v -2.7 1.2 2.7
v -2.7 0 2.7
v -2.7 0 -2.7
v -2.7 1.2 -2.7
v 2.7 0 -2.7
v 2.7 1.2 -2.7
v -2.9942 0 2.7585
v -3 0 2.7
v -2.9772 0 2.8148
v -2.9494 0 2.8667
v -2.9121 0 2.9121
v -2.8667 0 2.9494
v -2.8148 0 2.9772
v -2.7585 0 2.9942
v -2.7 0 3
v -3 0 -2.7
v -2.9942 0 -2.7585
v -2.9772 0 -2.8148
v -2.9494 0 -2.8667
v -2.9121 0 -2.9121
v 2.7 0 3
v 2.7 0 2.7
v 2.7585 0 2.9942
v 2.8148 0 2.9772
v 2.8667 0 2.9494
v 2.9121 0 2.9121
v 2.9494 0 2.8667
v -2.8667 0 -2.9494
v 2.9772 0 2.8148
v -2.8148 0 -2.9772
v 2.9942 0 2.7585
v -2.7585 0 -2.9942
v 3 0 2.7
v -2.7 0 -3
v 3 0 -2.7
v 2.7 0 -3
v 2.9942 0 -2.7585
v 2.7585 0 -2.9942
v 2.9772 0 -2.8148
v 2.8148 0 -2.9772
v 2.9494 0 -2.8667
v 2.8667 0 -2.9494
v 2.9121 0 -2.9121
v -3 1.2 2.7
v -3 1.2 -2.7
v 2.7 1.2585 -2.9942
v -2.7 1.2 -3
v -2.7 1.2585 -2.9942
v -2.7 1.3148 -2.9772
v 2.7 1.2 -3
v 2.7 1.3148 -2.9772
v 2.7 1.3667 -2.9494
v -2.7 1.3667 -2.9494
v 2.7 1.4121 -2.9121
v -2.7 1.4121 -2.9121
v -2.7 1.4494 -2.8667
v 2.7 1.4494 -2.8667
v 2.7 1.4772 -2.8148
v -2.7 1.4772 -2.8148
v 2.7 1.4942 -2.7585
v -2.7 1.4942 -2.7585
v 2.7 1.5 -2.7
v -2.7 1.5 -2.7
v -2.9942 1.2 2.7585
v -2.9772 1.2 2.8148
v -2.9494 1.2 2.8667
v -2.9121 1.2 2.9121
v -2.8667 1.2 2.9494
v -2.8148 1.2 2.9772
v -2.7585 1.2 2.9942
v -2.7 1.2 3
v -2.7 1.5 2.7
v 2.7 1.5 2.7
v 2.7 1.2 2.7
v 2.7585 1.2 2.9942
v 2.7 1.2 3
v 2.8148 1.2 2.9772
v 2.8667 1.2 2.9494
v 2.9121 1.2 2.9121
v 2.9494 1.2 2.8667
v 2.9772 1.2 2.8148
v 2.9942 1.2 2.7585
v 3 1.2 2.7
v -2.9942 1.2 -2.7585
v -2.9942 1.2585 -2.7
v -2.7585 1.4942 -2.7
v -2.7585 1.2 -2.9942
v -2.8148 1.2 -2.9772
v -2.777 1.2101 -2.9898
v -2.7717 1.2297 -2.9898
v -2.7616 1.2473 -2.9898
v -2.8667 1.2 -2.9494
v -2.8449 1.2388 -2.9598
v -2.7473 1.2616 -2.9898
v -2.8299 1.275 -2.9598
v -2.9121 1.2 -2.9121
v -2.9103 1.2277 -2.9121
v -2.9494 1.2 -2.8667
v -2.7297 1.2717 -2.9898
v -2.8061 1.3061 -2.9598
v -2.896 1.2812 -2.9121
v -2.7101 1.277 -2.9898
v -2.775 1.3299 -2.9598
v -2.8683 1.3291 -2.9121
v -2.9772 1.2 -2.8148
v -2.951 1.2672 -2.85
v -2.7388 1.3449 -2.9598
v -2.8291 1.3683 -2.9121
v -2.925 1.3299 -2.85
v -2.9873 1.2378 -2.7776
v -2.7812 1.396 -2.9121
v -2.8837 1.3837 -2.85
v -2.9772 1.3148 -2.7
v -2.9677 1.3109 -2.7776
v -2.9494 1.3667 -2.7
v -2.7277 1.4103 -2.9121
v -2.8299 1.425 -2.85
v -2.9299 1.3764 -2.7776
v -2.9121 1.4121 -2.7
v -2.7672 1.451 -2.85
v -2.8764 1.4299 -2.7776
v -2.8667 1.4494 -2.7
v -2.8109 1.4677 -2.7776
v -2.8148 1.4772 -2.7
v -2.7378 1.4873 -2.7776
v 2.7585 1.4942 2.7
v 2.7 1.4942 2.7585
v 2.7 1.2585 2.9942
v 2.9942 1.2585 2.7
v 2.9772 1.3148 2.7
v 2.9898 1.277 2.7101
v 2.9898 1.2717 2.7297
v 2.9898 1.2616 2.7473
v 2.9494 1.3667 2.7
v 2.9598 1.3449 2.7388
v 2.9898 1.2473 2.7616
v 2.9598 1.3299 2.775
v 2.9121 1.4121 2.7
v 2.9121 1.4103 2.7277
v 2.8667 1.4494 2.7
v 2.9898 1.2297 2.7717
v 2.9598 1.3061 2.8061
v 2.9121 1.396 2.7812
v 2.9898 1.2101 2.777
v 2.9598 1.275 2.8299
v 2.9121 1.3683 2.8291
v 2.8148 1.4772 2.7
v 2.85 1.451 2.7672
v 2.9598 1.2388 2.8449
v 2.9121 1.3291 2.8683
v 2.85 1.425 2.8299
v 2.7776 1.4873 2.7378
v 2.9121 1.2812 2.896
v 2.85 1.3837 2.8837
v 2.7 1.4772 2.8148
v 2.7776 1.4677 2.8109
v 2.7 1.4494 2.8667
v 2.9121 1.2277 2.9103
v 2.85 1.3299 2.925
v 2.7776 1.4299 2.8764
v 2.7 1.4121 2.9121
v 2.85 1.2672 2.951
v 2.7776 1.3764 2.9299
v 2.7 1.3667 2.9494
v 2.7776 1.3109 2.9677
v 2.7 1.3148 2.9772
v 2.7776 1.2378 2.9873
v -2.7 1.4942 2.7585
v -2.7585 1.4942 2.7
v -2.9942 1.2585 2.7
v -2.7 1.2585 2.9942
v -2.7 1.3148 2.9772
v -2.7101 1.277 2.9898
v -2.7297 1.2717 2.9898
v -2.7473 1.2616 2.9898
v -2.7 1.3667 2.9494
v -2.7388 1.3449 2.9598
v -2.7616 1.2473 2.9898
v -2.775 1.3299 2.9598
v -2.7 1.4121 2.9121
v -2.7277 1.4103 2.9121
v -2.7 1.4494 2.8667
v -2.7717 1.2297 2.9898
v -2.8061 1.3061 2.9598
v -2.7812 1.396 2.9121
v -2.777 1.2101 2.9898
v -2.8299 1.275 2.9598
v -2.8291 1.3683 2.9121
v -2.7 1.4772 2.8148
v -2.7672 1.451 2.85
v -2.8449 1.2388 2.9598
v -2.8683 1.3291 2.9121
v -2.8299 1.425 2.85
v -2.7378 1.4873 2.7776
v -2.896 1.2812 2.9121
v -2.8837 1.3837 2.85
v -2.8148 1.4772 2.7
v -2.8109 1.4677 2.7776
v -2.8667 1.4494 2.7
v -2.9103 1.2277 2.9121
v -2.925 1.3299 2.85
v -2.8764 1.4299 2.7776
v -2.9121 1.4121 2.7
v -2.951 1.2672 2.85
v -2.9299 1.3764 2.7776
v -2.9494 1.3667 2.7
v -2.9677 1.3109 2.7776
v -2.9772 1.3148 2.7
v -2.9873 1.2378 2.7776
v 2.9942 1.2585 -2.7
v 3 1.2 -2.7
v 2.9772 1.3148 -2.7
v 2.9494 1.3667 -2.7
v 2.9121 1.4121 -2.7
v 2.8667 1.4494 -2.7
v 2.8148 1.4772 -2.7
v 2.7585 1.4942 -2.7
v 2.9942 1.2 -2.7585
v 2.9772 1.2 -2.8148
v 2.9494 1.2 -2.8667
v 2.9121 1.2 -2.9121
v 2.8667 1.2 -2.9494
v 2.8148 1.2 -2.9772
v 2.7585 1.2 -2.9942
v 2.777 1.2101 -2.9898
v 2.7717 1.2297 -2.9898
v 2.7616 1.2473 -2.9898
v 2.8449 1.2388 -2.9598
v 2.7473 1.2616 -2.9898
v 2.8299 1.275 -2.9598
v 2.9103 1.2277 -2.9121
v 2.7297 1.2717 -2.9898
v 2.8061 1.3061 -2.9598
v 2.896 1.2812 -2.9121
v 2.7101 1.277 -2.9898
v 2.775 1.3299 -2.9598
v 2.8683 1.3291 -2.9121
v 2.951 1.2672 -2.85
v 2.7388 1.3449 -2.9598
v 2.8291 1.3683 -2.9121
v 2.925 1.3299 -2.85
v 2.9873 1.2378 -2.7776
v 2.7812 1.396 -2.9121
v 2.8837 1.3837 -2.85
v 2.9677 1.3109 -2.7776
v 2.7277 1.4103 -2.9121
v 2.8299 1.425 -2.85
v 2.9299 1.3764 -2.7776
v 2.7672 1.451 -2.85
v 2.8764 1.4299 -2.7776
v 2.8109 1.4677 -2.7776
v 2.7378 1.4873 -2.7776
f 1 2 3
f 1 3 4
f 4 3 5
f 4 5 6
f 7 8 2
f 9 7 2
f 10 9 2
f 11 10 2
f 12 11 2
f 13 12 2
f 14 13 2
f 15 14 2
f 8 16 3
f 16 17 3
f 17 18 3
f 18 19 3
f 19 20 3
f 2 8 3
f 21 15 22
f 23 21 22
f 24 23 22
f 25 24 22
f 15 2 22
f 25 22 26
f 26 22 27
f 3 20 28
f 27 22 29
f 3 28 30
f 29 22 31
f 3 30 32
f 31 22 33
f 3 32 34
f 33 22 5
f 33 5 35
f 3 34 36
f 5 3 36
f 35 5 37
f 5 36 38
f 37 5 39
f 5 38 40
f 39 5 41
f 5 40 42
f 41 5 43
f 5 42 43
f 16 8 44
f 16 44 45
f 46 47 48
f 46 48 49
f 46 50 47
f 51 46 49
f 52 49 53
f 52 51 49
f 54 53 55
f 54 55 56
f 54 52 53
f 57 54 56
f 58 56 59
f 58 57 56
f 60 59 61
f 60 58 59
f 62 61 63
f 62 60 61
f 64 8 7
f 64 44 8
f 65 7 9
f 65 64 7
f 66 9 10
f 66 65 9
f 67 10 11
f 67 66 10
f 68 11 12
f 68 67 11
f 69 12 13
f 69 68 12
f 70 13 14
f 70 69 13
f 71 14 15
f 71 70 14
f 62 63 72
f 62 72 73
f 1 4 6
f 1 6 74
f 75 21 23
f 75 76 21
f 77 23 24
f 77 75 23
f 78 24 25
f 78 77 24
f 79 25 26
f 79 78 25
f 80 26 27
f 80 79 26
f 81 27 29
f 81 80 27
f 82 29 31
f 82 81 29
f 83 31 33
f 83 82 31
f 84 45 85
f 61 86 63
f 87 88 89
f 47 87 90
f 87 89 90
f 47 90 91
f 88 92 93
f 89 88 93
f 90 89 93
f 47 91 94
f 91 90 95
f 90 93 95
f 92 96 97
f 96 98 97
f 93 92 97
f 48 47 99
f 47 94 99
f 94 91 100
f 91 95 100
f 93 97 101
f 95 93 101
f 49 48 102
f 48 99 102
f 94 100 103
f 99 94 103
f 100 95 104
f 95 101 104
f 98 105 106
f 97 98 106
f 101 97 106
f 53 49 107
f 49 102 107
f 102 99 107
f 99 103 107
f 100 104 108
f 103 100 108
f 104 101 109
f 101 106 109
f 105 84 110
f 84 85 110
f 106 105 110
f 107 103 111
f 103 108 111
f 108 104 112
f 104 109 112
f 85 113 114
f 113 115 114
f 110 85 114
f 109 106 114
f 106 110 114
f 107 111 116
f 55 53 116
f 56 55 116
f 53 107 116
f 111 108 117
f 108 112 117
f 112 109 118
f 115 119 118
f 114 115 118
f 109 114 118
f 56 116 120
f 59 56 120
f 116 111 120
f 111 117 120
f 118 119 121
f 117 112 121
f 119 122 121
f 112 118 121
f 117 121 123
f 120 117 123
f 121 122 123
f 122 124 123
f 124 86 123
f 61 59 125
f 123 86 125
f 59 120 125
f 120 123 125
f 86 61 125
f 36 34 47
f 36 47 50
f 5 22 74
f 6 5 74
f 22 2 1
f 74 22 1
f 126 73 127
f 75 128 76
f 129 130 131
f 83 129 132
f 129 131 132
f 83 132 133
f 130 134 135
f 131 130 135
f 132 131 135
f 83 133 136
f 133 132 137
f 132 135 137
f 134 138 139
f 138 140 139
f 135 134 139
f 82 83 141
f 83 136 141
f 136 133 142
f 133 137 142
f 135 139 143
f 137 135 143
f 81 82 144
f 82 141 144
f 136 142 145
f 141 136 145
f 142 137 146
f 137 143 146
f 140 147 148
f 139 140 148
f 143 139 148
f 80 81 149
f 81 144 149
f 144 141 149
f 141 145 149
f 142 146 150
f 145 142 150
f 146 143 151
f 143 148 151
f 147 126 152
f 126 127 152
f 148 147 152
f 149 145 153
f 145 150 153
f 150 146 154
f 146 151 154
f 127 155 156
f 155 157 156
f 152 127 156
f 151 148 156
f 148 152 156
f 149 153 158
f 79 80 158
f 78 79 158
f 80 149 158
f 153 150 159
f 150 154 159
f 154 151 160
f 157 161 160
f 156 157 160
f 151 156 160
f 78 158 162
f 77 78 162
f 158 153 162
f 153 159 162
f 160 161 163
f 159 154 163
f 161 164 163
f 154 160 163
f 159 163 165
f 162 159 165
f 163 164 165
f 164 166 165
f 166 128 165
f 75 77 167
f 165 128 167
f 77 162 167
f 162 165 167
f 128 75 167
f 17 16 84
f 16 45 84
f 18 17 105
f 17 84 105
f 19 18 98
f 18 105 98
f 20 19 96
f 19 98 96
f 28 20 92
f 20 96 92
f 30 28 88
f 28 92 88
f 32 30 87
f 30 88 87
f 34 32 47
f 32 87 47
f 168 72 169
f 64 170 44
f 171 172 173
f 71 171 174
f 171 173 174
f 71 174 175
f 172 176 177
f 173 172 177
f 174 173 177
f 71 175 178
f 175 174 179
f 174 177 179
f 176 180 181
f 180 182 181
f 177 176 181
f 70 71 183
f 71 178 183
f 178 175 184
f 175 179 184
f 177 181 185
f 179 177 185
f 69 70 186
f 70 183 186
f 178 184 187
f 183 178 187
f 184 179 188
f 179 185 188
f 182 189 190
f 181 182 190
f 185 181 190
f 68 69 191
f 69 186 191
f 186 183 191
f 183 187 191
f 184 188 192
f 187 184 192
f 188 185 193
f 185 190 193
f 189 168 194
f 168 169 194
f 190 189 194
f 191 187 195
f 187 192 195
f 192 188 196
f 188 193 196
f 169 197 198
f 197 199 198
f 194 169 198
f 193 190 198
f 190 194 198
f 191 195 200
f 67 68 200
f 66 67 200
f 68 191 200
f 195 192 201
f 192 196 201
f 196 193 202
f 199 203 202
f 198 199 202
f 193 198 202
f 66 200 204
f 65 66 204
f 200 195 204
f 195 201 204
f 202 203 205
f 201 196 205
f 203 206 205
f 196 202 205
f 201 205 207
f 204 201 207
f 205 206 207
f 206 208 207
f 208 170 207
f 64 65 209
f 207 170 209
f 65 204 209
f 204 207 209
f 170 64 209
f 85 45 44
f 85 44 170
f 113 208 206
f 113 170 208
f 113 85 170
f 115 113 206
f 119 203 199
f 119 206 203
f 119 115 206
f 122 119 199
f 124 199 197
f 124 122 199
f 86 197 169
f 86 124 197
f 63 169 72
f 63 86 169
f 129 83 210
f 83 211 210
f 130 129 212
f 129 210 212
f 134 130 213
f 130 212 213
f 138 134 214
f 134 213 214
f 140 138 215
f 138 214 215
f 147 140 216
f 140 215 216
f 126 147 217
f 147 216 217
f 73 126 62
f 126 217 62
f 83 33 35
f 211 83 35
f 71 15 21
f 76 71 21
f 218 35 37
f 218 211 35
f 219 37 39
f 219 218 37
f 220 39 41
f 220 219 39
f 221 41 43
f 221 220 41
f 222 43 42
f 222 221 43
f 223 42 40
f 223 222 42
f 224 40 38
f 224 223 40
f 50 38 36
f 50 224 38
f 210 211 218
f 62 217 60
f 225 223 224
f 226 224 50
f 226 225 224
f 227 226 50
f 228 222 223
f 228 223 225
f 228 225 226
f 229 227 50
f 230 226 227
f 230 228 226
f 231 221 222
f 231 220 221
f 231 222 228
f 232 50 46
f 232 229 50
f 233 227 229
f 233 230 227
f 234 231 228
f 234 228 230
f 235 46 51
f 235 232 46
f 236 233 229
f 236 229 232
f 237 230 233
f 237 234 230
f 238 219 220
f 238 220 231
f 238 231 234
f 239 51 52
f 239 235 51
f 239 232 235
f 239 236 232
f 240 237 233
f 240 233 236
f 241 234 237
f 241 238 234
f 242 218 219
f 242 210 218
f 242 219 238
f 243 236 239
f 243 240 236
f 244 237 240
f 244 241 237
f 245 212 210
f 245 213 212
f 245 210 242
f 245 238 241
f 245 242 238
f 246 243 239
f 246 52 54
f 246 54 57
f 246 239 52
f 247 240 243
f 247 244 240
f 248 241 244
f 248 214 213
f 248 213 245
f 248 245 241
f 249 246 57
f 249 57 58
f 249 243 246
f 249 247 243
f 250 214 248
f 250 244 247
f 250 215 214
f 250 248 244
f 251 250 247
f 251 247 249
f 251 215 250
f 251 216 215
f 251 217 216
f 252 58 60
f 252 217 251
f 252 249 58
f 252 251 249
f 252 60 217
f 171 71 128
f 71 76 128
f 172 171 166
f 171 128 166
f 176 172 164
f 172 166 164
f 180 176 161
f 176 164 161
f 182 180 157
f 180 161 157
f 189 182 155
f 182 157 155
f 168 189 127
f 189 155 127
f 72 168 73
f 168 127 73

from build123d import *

# Parameters (mm, degrees)
SKETCH1_W           = 6
SKETCH1_H           = 6
BOSS_EXTRUDE1_DEPTH = 1.5
FILLET1_R           = 0.3
SHELL1_START        = -2.7
SHELL1_OUTLINE_W    = 1.2
SHELL1_OUTLINE_H    = 5.4
SHELL1_DEPTH        = 5.4


# Read off the part's stored shape, not the designer's step: Shell1
with BuildPart() as part:
    # Sketch1 → Boss-Extrude1 (new body)
    with BuildSketch(Plane(origin=(0, 0, 0), x_dir=(1, 0, 0), z_dir=(0, 1, 0))):
        Rectangle(SKETCH1_W, SKETCH1_H)
    extrude(amount=BOSS_EXTRUDE1_DEPTH)

    # Fillet1
    fillet1_edges = [part.edges().sort_by_distance(p)[0] for p in [
        (-3, 1.5, 0),
        (0, 1.5, 3),
        (3, 1.5, 0),
        (3, 0.75, 3),
        (-3, 0.75, 3),
        (-3, 0.75, -3),
        (3, 0.75, -3),
        (0, 1.5, -3),
    ]]
    fillet(fillet1_edges, radius=FILLET1_R)

    # Shell1 outline → Shell1 (cut)
    with BuildSketch(Plane.YZ.offset(SHELL1_START)):
        with Locations((0.6, 0)):
            Rectangle(SHELL1_OUTLINE_W, SHELL1_OUTLINE_H)
    extrude(amount=SHELL1_DEPTH, mode=Mode.SUBTRACT)


solid = part.part
